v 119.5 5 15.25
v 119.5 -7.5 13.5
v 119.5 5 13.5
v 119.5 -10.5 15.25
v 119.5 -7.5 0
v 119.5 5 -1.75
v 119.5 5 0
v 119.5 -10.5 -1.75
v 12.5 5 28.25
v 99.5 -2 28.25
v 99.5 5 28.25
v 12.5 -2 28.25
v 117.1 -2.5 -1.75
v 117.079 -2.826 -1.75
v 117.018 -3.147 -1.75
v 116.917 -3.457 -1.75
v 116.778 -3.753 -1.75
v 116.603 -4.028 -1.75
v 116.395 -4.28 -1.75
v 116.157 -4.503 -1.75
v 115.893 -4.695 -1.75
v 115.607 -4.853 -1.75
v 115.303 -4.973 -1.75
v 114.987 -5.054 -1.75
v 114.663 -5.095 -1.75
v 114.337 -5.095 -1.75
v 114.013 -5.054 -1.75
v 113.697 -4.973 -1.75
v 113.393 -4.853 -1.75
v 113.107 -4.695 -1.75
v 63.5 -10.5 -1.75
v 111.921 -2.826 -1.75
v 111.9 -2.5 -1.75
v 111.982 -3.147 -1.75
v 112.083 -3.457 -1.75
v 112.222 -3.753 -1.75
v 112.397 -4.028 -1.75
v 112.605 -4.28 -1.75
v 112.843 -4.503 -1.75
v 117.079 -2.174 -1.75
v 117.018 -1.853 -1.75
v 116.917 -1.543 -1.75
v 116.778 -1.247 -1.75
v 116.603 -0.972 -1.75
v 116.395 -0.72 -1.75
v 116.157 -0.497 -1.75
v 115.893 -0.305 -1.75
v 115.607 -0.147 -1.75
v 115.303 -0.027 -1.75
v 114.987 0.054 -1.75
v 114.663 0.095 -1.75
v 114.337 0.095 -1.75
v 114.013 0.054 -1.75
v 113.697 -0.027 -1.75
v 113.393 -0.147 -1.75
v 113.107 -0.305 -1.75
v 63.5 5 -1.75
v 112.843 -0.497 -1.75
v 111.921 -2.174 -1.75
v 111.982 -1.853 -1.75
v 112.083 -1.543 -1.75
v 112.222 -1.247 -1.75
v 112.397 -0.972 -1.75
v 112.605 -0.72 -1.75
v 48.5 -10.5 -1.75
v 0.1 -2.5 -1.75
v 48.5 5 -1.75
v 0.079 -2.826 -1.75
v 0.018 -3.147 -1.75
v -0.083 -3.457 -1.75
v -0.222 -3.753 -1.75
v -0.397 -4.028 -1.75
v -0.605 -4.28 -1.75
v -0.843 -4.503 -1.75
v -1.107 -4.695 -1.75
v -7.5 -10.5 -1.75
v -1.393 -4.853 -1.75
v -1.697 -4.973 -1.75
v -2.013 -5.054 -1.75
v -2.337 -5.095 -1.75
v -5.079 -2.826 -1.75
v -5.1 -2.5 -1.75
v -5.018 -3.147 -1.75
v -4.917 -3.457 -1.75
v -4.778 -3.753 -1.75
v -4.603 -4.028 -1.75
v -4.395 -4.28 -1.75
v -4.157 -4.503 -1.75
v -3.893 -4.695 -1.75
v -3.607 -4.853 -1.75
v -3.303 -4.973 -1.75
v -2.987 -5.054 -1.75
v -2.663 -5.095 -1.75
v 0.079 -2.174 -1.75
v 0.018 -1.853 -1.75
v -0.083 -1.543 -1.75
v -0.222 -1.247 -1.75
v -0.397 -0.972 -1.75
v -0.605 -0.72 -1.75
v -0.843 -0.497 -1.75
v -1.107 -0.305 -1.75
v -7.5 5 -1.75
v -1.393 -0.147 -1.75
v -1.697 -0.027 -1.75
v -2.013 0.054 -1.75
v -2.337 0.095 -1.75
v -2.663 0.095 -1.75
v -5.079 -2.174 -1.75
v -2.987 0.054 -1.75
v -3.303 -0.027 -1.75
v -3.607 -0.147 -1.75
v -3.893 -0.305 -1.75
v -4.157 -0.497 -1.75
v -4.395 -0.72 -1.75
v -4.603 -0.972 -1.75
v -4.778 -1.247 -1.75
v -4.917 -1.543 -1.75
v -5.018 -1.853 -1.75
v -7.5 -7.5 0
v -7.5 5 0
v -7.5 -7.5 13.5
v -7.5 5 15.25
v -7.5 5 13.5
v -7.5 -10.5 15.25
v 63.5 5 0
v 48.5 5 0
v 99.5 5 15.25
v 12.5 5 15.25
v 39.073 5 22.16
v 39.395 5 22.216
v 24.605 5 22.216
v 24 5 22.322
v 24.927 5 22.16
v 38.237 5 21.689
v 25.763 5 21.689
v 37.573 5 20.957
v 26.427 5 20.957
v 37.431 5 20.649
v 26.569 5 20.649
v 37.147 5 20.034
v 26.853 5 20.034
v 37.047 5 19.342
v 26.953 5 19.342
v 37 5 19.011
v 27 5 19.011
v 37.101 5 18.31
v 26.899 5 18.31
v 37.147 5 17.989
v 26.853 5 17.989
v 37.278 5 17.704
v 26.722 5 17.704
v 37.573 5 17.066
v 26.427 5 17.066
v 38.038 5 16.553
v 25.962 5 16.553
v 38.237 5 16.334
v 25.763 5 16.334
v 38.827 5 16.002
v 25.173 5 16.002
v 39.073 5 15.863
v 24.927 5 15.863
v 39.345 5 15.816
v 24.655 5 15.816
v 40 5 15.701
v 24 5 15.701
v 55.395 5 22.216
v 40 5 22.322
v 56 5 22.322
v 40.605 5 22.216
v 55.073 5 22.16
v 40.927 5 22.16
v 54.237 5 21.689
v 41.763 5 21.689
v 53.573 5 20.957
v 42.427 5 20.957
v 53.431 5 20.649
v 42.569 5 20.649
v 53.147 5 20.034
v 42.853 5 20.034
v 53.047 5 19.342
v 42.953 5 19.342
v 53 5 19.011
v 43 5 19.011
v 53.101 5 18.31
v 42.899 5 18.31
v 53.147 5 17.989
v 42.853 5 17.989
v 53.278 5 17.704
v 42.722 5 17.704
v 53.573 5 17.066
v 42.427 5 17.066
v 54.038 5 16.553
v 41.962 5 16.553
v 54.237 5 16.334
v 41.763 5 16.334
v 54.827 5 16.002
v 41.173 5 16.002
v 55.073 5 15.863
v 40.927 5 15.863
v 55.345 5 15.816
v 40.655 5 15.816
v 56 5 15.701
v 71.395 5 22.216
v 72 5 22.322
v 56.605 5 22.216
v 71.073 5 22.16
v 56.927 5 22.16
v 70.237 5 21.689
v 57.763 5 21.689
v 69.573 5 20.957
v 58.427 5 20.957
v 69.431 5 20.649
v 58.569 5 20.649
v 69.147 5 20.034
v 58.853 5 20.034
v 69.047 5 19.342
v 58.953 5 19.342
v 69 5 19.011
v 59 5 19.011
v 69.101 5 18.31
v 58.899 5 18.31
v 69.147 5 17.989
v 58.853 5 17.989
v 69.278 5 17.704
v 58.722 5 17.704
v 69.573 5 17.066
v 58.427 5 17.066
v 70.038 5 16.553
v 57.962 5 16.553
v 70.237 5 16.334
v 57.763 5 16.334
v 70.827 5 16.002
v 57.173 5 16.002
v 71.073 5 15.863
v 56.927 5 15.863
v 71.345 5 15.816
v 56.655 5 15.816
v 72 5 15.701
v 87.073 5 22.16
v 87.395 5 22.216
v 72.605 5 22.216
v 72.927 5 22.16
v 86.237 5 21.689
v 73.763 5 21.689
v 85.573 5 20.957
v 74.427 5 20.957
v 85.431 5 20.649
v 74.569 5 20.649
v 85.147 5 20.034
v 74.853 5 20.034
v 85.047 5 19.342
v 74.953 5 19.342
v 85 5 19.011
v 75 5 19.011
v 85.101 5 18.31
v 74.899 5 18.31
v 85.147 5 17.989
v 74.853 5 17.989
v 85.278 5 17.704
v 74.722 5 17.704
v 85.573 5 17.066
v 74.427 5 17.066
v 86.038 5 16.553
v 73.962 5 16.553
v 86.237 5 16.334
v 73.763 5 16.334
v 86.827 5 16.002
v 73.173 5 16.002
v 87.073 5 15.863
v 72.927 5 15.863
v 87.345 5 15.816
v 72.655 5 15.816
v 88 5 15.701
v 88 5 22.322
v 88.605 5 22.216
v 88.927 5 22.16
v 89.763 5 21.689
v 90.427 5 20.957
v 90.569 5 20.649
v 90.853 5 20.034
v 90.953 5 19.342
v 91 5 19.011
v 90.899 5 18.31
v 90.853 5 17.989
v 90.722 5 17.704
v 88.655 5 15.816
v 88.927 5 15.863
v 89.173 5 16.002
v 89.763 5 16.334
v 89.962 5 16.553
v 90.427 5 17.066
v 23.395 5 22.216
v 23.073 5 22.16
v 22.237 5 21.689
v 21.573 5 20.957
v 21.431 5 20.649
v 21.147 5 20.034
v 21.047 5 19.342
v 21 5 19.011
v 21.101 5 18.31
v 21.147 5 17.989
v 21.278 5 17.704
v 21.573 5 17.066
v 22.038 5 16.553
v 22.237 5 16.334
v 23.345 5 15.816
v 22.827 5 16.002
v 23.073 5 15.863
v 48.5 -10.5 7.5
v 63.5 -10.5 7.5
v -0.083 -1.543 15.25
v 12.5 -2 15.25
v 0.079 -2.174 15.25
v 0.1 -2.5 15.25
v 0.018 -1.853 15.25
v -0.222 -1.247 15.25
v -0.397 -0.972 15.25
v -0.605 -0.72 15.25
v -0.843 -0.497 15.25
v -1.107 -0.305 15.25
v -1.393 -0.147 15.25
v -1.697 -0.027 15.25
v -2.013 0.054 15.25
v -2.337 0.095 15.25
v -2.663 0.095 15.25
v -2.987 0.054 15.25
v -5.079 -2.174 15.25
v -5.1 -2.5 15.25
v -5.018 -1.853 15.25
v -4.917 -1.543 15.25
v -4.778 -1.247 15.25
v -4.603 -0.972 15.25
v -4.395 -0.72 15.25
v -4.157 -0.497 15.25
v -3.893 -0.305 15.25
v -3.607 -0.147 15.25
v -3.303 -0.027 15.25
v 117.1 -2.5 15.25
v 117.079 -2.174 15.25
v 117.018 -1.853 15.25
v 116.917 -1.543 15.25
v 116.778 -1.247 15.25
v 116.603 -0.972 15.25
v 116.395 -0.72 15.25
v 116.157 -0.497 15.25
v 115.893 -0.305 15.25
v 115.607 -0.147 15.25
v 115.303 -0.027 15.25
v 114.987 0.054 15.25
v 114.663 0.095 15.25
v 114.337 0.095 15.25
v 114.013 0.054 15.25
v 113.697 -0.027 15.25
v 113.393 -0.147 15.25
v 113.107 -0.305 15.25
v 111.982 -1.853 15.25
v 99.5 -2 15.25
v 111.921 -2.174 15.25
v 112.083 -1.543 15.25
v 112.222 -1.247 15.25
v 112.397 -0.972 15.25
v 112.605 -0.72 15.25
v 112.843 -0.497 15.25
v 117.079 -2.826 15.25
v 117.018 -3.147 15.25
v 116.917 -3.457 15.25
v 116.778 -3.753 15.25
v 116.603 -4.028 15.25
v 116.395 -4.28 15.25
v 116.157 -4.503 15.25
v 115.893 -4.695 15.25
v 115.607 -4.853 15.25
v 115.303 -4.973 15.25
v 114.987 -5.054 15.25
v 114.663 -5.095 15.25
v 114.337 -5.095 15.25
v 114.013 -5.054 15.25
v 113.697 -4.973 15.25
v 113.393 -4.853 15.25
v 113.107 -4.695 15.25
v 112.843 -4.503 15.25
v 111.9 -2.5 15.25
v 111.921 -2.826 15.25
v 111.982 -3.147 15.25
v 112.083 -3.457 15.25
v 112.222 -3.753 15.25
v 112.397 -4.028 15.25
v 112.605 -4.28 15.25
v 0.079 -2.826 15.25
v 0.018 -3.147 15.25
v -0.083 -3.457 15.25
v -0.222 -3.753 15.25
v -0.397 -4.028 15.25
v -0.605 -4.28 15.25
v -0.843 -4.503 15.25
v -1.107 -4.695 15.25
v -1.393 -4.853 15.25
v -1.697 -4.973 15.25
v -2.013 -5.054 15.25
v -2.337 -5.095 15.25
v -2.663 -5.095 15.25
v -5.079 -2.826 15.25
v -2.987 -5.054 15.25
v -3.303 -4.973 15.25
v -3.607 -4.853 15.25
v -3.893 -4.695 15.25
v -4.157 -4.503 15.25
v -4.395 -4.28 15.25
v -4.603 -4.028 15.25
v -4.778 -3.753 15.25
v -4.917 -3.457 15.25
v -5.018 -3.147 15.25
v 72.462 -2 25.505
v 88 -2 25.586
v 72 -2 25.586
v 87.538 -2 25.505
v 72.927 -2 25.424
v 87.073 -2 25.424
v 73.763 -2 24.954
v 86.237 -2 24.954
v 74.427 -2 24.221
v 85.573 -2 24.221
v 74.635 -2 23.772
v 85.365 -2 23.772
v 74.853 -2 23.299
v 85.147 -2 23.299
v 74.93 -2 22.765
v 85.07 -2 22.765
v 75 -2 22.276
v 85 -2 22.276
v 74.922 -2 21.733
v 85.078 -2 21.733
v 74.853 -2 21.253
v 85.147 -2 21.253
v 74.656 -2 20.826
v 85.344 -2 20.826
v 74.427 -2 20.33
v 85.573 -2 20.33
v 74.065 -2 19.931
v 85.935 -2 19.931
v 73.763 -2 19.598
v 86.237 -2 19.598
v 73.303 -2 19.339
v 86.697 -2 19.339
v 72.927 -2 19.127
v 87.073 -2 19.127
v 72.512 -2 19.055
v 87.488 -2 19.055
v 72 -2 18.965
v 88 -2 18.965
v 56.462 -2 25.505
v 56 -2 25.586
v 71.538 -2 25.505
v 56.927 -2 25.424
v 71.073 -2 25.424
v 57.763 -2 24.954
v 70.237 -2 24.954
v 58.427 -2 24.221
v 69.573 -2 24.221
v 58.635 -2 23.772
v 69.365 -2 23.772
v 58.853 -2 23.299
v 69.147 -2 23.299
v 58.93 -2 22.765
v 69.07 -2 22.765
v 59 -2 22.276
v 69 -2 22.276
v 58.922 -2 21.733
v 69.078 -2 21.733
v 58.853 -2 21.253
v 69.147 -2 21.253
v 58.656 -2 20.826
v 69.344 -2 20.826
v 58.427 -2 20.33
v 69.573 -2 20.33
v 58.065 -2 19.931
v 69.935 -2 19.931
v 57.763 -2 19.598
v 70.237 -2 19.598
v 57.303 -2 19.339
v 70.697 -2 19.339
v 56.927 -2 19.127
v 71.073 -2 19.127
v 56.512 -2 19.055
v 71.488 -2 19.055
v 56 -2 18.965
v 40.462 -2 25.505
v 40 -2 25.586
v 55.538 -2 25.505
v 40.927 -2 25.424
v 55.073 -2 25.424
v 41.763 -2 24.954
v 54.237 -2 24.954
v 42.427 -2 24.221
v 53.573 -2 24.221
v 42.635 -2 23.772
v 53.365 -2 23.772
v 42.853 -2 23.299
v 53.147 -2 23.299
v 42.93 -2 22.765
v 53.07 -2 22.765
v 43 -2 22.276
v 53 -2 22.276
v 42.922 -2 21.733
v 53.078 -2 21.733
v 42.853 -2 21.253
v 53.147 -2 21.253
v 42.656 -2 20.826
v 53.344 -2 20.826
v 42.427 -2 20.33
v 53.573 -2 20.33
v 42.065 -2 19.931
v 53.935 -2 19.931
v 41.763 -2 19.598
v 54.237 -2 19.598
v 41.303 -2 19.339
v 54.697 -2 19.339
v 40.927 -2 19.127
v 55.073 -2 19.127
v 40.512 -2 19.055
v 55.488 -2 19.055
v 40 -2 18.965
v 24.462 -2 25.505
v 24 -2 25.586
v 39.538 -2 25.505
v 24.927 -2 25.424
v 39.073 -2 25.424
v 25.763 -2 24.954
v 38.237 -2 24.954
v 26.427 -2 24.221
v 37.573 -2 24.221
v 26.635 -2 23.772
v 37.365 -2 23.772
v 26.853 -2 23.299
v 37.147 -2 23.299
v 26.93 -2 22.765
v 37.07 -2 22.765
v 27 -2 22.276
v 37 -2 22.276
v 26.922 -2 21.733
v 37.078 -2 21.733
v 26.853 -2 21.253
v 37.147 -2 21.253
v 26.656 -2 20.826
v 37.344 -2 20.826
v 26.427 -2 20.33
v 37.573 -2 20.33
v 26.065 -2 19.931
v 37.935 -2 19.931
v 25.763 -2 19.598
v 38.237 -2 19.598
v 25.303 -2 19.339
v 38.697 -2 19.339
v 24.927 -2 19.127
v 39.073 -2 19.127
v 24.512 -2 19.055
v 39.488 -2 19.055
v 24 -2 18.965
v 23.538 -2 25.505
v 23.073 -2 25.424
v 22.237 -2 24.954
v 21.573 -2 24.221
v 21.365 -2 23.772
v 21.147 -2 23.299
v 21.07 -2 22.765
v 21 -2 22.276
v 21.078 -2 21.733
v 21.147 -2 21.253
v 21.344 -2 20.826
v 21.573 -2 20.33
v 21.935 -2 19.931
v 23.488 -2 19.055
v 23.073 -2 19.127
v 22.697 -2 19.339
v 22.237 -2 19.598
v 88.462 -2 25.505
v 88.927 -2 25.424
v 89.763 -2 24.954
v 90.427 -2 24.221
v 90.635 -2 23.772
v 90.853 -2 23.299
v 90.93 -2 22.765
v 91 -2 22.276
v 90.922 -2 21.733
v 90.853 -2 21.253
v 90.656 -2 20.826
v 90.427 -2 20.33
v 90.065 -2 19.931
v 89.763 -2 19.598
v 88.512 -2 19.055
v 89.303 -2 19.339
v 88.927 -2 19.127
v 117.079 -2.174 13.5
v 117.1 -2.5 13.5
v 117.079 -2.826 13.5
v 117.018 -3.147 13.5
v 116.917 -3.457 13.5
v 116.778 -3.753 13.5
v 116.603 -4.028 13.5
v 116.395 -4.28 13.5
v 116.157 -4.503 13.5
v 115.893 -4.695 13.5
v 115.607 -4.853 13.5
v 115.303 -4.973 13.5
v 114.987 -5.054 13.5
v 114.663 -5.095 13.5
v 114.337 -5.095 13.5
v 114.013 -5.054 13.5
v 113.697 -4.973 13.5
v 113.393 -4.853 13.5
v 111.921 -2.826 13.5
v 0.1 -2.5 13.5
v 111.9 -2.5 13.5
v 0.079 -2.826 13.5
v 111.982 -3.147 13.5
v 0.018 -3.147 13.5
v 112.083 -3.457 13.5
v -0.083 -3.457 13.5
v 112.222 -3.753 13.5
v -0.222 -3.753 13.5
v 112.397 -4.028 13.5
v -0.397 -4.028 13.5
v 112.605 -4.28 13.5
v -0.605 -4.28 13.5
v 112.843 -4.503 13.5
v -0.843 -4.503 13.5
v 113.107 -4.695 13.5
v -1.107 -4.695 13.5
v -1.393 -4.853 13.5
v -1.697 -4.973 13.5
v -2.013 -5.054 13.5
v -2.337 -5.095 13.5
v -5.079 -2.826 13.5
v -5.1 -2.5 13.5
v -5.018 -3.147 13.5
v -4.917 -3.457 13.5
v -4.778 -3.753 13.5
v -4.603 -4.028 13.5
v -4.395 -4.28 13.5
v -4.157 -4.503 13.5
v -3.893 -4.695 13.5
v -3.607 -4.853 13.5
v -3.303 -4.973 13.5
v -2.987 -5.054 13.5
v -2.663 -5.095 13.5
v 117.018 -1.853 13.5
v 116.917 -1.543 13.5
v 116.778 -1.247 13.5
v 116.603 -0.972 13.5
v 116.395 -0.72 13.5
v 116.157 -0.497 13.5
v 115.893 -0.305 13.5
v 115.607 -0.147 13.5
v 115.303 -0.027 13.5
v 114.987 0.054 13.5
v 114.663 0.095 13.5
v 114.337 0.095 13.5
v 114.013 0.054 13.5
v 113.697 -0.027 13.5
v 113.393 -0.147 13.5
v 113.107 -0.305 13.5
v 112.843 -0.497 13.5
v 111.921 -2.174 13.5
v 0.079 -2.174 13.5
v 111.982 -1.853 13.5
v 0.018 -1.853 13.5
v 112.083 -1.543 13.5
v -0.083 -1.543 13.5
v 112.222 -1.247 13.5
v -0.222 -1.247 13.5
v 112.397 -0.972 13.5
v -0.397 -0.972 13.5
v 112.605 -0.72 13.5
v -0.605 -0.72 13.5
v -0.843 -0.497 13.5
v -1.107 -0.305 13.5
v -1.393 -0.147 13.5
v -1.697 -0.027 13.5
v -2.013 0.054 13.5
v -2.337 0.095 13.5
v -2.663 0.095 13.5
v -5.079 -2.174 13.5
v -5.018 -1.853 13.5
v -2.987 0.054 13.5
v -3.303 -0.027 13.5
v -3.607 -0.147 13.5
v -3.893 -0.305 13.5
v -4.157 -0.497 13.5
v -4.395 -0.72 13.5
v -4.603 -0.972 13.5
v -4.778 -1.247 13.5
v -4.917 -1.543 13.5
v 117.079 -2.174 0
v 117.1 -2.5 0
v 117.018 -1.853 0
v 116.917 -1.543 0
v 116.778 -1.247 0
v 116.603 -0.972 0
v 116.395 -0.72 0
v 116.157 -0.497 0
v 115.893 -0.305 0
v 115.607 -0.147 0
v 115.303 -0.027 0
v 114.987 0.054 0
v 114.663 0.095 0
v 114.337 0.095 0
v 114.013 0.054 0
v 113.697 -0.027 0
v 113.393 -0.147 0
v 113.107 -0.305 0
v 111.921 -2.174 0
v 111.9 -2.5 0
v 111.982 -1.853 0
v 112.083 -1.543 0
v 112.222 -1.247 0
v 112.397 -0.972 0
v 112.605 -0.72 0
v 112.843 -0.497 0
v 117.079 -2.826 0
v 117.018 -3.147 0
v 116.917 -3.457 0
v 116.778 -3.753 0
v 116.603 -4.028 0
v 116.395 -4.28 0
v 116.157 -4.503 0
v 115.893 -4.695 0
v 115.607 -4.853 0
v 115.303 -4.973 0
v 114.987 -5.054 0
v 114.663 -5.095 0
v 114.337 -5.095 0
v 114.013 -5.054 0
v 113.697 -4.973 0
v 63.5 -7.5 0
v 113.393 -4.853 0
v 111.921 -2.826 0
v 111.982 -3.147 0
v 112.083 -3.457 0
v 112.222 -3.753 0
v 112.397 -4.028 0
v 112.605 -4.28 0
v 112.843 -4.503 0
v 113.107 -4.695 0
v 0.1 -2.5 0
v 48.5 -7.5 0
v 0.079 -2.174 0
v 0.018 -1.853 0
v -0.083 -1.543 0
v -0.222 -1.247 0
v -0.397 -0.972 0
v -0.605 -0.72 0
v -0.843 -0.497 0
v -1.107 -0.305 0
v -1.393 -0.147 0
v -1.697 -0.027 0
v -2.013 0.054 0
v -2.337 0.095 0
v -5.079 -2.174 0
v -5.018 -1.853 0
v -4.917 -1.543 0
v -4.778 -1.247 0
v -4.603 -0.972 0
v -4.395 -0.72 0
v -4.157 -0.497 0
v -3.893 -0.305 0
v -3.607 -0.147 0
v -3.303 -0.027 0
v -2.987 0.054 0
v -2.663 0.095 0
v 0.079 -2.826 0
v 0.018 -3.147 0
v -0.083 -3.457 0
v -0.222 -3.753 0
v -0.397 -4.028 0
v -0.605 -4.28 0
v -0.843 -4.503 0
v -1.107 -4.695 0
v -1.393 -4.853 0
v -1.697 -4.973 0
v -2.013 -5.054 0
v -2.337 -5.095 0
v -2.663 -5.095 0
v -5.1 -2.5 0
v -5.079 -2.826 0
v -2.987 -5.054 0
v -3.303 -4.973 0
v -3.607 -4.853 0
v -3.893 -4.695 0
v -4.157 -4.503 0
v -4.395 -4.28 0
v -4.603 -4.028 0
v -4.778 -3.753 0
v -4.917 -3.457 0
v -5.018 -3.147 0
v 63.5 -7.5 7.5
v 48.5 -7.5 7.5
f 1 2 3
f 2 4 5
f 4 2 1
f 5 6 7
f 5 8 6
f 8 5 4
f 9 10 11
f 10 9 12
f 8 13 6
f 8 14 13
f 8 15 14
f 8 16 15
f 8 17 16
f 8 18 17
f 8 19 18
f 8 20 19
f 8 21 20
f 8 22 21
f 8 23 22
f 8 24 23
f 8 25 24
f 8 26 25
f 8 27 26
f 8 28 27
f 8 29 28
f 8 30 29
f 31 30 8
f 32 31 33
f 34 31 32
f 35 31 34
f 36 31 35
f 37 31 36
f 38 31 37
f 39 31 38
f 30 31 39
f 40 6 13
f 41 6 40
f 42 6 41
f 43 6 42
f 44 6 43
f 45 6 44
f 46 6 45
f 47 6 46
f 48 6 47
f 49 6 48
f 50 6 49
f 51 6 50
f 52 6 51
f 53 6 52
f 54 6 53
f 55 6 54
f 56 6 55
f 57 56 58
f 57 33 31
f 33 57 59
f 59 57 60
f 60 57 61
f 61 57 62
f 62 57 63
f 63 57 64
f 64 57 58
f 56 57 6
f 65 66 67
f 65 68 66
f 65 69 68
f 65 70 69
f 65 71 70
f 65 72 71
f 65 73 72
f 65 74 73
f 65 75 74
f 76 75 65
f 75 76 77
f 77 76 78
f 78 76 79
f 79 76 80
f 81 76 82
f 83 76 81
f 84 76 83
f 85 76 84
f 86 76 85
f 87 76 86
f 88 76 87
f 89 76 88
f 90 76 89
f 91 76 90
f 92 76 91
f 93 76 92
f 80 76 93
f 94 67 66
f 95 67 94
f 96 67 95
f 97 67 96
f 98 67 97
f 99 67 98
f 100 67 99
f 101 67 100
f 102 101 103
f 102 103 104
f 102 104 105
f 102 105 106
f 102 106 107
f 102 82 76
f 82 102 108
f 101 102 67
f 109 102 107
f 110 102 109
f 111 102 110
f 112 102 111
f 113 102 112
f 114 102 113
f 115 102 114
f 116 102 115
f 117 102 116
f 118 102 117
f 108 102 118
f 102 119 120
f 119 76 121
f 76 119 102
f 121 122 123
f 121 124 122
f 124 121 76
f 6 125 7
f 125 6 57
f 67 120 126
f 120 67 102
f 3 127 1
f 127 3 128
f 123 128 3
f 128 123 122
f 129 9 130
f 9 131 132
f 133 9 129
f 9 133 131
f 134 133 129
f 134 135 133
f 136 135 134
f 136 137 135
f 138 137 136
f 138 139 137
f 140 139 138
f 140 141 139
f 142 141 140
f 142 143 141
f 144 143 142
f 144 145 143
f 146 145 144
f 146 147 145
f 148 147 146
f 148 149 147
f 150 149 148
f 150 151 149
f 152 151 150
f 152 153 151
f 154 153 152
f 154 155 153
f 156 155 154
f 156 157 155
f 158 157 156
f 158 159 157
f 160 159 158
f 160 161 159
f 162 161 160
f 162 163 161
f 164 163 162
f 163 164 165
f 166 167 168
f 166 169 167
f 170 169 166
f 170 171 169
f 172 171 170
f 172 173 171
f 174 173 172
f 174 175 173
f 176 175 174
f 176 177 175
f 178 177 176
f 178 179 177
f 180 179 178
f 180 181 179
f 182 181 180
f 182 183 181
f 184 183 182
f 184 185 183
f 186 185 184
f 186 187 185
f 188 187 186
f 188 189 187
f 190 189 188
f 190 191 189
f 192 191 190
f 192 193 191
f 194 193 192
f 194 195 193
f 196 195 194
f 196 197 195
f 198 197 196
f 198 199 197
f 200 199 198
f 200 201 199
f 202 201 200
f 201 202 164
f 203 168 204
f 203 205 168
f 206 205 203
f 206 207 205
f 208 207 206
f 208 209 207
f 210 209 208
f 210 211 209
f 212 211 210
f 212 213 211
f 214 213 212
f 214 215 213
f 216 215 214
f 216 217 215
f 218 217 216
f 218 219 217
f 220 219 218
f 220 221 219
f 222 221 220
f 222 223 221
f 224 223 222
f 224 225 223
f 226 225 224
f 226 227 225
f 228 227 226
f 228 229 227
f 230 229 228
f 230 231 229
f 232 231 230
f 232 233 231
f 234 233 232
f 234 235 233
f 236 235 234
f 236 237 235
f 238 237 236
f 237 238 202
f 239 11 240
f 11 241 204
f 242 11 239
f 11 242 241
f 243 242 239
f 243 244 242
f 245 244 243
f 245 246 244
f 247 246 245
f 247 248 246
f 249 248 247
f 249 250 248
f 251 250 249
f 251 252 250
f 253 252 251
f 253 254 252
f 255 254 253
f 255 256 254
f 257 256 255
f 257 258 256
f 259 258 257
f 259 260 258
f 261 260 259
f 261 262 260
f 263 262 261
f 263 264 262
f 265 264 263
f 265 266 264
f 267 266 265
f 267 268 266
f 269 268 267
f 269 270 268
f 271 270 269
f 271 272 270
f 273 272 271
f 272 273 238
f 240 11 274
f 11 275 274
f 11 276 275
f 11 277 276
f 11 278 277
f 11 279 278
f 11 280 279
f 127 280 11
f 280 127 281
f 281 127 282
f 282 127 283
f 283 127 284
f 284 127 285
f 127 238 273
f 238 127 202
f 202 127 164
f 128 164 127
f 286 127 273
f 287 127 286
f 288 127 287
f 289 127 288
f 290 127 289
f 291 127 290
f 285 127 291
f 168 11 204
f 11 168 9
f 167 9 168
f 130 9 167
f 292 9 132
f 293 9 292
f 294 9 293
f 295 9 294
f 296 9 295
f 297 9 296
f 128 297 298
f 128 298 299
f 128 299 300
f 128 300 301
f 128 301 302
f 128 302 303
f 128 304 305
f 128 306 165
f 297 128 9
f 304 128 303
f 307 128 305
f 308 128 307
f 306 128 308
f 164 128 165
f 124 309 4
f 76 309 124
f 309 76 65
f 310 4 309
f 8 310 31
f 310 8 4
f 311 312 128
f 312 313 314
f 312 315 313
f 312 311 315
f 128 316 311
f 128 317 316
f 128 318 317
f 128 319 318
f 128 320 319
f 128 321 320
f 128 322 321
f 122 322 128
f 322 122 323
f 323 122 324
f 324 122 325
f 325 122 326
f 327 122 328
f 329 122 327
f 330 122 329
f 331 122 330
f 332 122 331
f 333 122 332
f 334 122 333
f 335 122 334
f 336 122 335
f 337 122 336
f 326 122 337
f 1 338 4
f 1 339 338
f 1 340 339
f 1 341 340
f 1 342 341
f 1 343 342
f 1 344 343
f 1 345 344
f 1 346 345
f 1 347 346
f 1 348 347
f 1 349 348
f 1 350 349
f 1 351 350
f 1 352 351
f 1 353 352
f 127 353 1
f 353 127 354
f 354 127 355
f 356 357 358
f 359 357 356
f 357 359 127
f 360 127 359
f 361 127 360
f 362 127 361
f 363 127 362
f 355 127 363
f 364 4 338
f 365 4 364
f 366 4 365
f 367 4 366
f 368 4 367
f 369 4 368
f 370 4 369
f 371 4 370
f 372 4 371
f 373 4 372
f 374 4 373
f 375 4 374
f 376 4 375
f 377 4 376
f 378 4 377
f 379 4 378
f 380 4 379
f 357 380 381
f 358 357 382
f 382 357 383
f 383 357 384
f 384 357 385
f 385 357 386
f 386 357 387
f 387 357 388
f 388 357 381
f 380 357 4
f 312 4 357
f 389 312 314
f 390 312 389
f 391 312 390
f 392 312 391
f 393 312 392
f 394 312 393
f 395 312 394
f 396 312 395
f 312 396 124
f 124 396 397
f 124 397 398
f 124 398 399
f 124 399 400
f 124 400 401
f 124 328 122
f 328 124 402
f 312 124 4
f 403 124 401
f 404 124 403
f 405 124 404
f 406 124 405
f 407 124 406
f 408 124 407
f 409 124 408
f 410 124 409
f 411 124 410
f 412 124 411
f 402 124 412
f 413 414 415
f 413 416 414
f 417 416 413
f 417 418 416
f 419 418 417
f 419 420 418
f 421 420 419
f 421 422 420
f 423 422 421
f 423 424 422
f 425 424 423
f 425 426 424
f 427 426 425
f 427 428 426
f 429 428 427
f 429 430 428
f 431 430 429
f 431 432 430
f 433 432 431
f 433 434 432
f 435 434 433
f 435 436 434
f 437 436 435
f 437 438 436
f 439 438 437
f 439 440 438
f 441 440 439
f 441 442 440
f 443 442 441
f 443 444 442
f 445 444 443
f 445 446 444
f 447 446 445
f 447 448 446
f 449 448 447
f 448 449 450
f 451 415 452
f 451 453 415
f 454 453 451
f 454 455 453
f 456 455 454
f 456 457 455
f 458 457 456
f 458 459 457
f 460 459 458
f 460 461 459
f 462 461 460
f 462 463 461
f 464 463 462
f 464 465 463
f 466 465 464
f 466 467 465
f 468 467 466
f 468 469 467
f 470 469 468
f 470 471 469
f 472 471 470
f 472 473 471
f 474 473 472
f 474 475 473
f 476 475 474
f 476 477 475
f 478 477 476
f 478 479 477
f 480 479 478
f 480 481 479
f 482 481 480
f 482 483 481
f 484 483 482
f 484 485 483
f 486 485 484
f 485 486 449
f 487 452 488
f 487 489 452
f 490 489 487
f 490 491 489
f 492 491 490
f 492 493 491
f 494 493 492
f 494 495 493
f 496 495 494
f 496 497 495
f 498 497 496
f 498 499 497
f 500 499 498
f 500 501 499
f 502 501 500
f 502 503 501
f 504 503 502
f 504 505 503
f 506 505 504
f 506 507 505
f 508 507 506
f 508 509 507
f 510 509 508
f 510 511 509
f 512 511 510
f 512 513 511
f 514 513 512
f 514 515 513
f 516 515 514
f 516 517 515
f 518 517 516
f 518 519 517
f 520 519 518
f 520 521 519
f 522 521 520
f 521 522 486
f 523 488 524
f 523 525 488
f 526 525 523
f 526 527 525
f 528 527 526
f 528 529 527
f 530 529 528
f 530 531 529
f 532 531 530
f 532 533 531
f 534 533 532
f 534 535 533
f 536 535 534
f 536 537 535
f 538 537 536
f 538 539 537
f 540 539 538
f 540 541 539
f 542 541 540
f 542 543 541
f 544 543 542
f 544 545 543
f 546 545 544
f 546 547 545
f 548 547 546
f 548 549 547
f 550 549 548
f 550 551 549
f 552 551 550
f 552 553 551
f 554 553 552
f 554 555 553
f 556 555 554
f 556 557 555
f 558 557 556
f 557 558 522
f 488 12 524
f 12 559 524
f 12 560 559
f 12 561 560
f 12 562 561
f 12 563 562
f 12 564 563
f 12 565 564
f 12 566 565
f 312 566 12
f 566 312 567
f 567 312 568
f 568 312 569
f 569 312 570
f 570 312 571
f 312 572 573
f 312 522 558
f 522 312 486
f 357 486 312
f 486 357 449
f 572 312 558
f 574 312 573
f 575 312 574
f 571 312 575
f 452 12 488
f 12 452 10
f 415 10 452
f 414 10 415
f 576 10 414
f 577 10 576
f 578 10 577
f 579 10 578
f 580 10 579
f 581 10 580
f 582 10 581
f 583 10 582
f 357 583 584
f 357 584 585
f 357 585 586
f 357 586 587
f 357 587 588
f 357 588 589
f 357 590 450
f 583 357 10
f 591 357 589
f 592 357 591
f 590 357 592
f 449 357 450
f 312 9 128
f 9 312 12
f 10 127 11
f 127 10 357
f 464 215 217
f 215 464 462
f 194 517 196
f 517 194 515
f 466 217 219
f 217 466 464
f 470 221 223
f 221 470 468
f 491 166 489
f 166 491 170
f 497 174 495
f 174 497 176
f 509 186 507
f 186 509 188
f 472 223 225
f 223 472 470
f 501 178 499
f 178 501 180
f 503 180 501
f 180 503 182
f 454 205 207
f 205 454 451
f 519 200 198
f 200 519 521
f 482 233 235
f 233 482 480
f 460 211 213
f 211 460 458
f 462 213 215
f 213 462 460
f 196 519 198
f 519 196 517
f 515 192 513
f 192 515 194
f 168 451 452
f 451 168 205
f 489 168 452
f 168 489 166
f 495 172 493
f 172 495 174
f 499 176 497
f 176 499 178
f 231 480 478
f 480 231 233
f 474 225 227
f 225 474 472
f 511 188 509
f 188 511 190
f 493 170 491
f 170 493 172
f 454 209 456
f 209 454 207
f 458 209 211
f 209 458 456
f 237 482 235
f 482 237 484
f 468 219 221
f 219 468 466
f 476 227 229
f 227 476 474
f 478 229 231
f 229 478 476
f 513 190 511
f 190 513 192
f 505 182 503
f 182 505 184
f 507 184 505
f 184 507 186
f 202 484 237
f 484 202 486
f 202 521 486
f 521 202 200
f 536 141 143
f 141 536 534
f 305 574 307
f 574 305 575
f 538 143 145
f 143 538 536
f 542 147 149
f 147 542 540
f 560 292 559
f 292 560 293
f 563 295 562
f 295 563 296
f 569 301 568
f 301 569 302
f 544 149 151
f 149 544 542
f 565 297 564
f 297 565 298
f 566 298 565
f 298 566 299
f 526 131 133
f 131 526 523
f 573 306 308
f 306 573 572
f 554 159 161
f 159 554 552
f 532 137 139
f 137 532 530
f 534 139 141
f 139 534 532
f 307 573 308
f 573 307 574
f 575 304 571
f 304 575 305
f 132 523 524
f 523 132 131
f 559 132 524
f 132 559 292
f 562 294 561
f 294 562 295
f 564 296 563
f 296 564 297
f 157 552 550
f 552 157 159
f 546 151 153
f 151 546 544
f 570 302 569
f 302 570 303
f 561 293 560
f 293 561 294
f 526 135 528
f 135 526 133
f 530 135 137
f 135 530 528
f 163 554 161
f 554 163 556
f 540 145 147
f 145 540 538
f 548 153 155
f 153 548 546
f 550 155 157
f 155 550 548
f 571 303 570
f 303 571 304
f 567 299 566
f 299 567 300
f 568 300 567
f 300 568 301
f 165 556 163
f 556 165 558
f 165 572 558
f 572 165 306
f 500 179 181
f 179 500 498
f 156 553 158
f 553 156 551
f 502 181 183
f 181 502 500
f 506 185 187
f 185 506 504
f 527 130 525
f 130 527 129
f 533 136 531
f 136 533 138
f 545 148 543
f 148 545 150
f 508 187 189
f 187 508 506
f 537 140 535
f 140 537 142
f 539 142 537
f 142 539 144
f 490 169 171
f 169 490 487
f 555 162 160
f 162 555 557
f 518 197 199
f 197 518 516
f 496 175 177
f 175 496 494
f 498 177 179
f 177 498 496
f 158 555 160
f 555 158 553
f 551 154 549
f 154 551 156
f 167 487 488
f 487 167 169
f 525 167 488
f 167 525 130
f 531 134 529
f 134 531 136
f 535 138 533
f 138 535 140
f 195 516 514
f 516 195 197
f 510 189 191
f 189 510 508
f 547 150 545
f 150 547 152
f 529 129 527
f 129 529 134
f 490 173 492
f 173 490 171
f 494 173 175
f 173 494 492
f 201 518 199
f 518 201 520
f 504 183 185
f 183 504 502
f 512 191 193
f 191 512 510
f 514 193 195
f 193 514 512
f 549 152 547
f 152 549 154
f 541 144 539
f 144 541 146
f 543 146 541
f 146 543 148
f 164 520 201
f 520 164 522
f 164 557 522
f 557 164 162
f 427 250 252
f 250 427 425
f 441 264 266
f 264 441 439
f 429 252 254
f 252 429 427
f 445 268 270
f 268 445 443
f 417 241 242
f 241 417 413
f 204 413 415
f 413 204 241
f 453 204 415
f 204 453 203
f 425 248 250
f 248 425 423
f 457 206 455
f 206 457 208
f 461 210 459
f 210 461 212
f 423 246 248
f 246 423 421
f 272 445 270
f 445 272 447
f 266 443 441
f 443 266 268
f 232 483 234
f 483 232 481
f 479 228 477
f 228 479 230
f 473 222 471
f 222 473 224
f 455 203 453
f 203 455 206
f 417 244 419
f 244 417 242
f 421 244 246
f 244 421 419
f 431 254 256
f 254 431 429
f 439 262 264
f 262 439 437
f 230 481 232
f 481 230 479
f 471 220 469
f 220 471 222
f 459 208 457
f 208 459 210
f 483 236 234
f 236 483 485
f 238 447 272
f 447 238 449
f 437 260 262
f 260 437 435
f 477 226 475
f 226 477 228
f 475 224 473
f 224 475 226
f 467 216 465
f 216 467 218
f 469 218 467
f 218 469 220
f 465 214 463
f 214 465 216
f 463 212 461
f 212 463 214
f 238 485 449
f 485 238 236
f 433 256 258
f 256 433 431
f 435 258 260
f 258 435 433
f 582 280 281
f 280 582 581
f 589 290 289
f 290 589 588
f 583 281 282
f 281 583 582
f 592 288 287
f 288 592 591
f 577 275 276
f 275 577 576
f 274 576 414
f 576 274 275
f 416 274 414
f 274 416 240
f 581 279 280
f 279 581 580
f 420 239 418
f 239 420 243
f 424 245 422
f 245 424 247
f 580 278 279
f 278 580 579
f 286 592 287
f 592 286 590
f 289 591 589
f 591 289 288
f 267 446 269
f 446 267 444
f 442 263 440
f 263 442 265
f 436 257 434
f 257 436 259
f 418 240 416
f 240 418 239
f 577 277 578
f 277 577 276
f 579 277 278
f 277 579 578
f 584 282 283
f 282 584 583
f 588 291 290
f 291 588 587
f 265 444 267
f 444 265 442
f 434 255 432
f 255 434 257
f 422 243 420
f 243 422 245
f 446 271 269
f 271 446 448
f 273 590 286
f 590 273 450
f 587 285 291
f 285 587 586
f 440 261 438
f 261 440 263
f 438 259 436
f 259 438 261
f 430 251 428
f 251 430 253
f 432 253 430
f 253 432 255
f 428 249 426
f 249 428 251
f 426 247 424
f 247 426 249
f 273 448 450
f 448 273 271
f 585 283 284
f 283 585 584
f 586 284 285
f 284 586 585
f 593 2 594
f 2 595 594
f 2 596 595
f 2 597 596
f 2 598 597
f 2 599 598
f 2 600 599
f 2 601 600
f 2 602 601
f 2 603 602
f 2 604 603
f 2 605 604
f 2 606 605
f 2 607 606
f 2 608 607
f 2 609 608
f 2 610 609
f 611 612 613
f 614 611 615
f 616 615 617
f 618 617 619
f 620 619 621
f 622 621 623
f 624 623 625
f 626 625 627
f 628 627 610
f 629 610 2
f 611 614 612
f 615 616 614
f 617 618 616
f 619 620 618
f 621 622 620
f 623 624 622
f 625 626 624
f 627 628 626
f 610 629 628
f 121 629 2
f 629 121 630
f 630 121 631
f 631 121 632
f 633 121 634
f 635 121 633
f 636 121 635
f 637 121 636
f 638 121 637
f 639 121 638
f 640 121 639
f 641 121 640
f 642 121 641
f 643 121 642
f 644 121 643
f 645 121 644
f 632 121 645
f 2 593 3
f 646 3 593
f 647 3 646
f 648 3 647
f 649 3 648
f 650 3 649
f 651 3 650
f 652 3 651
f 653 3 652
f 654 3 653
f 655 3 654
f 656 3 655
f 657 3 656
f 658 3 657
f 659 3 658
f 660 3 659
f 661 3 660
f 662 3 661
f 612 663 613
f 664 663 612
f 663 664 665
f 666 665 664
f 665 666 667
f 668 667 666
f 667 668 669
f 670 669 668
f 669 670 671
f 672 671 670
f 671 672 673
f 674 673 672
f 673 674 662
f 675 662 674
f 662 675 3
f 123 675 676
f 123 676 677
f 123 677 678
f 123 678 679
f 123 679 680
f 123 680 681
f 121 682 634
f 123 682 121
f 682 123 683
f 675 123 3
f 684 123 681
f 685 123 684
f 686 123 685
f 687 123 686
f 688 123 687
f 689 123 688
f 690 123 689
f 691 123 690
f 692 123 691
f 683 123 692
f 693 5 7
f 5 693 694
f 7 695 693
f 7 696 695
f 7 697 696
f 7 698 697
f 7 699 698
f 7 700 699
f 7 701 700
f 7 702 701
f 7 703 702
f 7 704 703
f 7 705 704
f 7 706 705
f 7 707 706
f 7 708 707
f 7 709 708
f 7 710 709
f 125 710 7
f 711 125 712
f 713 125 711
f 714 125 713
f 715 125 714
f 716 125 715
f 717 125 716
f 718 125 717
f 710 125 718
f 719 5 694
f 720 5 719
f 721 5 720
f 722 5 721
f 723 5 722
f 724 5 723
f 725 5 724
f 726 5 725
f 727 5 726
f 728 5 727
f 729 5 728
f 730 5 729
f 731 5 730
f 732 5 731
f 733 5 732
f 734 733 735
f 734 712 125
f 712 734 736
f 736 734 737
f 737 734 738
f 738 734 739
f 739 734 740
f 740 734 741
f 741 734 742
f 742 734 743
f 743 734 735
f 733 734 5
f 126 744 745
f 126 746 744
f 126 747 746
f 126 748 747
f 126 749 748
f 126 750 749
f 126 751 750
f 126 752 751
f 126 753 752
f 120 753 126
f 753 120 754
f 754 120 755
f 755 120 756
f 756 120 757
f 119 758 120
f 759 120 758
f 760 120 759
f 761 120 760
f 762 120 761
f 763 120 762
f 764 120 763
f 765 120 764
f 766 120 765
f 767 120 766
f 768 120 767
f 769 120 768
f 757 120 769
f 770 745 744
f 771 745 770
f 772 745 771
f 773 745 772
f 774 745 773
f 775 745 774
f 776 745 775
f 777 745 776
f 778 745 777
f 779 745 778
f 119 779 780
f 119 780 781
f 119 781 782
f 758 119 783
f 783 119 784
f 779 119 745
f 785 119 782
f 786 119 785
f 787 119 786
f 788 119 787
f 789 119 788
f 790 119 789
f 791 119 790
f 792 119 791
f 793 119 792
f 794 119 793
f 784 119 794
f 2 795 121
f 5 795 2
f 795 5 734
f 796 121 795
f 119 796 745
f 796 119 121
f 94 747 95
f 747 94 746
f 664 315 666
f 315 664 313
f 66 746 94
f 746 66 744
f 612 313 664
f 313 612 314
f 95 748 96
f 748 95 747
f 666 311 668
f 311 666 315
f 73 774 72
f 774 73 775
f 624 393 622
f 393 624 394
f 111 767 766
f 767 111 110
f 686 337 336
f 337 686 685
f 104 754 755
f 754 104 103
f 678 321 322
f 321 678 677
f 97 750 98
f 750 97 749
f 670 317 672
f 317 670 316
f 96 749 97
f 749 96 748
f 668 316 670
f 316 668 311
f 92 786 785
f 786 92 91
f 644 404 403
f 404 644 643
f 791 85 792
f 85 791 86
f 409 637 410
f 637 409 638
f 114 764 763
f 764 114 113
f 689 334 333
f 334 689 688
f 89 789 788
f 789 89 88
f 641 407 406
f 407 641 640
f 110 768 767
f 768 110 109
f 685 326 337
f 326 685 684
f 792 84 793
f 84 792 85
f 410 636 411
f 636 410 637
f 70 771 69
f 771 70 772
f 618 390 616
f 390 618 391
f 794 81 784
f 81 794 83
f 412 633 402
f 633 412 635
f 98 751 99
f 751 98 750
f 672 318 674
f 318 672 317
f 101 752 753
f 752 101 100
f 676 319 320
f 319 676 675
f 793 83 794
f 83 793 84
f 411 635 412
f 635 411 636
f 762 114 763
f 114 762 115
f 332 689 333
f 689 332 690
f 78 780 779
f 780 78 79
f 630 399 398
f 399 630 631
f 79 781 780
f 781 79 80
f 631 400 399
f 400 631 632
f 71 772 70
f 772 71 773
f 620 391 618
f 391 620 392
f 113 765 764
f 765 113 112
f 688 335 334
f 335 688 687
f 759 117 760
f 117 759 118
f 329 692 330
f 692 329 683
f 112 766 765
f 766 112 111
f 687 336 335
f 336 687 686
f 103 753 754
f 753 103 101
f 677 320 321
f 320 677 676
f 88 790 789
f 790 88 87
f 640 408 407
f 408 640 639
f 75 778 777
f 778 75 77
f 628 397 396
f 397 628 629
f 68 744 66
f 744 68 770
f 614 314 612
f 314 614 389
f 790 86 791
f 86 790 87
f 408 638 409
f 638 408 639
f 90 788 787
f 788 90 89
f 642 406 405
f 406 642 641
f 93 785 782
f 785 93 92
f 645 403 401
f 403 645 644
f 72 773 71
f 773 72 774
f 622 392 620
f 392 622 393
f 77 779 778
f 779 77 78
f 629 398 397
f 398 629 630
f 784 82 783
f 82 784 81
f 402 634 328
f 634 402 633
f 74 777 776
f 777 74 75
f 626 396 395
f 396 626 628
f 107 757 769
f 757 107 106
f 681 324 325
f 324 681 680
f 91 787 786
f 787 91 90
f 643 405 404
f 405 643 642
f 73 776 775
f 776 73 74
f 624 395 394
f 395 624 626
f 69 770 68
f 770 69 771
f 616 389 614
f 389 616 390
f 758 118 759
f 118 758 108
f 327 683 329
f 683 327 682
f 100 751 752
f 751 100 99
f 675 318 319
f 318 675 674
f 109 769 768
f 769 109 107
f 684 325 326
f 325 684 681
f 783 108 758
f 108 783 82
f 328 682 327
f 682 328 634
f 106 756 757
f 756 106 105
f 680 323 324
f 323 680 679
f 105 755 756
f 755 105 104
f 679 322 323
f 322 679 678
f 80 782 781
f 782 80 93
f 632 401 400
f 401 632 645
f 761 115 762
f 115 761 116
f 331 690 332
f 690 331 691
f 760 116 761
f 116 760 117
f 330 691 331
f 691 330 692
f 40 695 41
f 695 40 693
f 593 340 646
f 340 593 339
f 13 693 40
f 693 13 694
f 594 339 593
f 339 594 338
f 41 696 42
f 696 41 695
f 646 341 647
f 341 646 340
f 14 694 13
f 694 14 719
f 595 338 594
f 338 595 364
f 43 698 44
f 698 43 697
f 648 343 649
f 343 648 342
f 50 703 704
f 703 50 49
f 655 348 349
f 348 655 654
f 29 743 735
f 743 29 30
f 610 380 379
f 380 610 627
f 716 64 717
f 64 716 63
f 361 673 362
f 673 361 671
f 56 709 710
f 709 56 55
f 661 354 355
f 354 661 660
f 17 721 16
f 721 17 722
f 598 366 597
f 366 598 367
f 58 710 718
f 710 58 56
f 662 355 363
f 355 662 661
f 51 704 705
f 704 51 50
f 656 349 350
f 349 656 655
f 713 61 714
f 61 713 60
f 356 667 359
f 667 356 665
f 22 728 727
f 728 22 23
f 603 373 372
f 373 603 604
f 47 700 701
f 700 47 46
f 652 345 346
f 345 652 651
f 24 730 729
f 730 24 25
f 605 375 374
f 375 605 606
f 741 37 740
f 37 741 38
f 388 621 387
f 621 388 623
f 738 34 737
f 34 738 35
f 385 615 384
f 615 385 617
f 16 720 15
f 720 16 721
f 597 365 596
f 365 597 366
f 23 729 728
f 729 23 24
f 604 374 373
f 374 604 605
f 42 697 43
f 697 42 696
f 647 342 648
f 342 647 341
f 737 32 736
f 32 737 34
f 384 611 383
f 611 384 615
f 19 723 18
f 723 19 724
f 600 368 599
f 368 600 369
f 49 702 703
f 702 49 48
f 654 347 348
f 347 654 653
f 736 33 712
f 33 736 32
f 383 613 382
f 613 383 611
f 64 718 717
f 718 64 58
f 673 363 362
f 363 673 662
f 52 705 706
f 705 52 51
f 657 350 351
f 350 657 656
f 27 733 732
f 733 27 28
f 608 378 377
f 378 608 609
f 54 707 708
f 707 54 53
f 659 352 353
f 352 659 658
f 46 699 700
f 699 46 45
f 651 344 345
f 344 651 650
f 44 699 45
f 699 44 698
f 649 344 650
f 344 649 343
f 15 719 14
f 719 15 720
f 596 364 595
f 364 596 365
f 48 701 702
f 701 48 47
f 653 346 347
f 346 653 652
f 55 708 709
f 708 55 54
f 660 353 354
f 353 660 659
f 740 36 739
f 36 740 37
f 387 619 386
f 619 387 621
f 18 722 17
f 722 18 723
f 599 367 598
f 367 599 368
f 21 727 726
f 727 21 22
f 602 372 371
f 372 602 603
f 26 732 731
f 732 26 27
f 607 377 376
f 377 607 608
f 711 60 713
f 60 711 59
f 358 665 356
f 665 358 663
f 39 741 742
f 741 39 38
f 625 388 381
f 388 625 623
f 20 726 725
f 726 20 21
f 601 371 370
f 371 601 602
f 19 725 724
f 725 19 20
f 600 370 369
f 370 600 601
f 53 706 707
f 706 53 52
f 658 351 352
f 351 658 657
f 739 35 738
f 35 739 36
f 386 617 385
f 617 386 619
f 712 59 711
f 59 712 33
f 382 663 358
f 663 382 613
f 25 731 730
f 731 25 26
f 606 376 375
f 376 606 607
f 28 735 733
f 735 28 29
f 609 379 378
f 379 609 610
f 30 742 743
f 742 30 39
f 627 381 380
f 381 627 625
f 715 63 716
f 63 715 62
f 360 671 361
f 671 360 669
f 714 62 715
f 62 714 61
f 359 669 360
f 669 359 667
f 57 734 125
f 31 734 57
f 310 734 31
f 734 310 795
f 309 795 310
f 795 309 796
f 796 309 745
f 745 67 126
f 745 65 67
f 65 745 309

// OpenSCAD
// BZ platform pumps clip
// This is a 3D printed devide that will be attached to the BZ grid
// In order to create 4 inputs to connect 4 pumps.

//Cell dimensions

nx = 7;     //number of cells in x
ny = 7;     //number of cells in y
cx = 16;     //cell width
cy = 16;     //cell length
cz = 11;     //cell depth

//Base and edge thicknesses

base = 1.5;
edge = 15;

//Calculate arena dimensions

ax = nx*cx;
ay = ny*cy;
az = cz;
bz = az + base;     //depth

//Bolt hole paramters

boltd = 5.2;  //bolt diameter
bolte = 5;  //distance from edge


module clip(){
    side = ax+edge;
    hs = side/2;
    difference(){
        cube([side, (edge/2)+8, 30]);
        translate([0,0,17])cube([side, (edge/2)+1, 15]);
        translate([0,-5,17])cube([20, 50, 15]);
        translate([107,-5,17])cube([20, 50, 15]);
        translate([hs,30,14])rotate([65,0,0])cylinder(h=50,d=6, $fn=20);
        translate([hs-32,30,14])rotate([65,0,0])cylinder(h=50,d=6, $fn=20);
        translate([hs-16,30,14])rotate([65,0,0])cylinder(h=50,d=6, $fn=20);
        translate([hs+16,30,14])rotate([65,0,0])cylinder(h=50,d=6, $fn=20);
        translate([hs+32,30,14])rotate([65,0,0])cylinder(h=50,d=6, $fn=20);
        //translate([4,9,-12])rotate([0,0,0])cylinder(h=50,d=5, $fn=20);
        //translate([56,9,-12])rotate([0,0,0])cylinder(h=50,d=5, $fn=20);
    }
}


module base(){
    union(){
        translate([-edge/2,-edge/2,0])cube([ax+edge,ay+edge,bz+1]);
        translate([-edge/2+bolte,-edge/2+bolte,-9])
        cylinder(h=bz+20,d=boltd,$fn=50);
        translate([ax+edge/2-bolte,-edge/2+bolte,-9])
        cylinder(h=bz+20,d=boltd,$fn=50);     
        translate([-edge/2+bolte,ay+edge/2-bolte,-9])
        cylinder(h=bz+20,d=boltd,$fn=50);
        translate([ax+edge/2-bolte,ay+edge/2-bolte,-9])
        cylinder(h=bz+20,d=boltd,$fn=50);
        translate([ax/2,-base-1,0])cube([15,20,15],true); // drain
    }
}


difference() {
    translate([-edge/2,(-edge/2)-3, -1.75])
    clip();
    base();
    
}
